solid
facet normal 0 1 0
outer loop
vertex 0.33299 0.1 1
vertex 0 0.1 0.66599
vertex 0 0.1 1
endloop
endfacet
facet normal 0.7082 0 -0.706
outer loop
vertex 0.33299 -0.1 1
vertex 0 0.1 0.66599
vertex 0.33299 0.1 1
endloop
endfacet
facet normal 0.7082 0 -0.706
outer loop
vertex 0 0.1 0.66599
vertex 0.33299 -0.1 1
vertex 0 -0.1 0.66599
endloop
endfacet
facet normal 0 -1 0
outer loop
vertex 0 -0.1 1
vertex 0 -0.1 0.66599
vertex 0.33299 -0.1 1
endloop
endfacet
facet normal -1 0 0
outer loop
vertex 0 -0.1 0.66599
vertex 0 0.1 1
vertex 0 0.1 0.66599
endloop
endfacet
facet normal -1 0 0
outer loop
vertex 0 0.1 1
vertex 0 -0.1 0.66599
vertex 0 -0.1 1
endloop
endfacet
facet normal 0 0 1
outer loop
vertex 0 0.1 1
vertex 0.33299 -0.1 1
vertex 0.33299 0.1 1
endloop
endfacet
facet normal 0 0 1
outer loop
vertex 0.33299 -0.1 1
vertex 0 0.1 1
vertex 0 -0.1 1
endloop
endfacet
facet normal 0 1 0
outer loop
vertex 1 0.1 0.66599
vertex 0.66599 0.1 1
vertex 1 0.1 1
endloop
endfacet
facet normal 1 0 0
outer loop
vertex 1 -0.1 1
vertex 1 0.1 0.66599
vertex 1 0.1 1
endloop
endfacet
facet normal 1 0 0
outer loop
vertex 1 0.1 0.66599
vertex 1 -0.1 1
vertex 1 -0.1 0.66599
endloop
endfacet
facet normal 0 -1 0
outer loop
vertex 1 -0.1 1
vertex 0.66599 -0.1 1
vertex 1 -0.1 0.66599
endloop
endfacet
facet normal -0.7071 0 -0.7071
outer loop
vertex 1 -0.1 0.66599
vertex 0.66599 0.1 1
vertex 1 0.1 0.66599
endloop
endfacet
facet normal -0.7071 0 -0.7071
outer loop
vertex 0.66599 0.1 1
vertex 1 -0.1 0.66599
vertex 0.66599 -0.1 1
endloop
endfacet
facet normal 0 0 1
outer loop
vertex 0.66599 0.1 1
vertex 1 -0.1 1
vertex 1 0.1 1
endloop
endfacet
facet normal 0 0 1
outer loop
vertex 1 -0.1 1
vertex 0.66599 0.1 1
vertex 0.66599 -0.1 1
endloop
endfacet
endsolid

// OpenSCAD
color([0.3, 0.3, 0.5])
translate([0,0.1,0])
union() {
    rotate([90, 0, 0])
    linear_extrude(0.2) {
        polygon([[0,1], [0.333,1], [0,0.666]]);
    }
    
    rotate([90, 0, 0])
    linear_extrude(0.2) {
        polygon([[1,1], [0.666,1], [1,0.666]]);
    }
}
